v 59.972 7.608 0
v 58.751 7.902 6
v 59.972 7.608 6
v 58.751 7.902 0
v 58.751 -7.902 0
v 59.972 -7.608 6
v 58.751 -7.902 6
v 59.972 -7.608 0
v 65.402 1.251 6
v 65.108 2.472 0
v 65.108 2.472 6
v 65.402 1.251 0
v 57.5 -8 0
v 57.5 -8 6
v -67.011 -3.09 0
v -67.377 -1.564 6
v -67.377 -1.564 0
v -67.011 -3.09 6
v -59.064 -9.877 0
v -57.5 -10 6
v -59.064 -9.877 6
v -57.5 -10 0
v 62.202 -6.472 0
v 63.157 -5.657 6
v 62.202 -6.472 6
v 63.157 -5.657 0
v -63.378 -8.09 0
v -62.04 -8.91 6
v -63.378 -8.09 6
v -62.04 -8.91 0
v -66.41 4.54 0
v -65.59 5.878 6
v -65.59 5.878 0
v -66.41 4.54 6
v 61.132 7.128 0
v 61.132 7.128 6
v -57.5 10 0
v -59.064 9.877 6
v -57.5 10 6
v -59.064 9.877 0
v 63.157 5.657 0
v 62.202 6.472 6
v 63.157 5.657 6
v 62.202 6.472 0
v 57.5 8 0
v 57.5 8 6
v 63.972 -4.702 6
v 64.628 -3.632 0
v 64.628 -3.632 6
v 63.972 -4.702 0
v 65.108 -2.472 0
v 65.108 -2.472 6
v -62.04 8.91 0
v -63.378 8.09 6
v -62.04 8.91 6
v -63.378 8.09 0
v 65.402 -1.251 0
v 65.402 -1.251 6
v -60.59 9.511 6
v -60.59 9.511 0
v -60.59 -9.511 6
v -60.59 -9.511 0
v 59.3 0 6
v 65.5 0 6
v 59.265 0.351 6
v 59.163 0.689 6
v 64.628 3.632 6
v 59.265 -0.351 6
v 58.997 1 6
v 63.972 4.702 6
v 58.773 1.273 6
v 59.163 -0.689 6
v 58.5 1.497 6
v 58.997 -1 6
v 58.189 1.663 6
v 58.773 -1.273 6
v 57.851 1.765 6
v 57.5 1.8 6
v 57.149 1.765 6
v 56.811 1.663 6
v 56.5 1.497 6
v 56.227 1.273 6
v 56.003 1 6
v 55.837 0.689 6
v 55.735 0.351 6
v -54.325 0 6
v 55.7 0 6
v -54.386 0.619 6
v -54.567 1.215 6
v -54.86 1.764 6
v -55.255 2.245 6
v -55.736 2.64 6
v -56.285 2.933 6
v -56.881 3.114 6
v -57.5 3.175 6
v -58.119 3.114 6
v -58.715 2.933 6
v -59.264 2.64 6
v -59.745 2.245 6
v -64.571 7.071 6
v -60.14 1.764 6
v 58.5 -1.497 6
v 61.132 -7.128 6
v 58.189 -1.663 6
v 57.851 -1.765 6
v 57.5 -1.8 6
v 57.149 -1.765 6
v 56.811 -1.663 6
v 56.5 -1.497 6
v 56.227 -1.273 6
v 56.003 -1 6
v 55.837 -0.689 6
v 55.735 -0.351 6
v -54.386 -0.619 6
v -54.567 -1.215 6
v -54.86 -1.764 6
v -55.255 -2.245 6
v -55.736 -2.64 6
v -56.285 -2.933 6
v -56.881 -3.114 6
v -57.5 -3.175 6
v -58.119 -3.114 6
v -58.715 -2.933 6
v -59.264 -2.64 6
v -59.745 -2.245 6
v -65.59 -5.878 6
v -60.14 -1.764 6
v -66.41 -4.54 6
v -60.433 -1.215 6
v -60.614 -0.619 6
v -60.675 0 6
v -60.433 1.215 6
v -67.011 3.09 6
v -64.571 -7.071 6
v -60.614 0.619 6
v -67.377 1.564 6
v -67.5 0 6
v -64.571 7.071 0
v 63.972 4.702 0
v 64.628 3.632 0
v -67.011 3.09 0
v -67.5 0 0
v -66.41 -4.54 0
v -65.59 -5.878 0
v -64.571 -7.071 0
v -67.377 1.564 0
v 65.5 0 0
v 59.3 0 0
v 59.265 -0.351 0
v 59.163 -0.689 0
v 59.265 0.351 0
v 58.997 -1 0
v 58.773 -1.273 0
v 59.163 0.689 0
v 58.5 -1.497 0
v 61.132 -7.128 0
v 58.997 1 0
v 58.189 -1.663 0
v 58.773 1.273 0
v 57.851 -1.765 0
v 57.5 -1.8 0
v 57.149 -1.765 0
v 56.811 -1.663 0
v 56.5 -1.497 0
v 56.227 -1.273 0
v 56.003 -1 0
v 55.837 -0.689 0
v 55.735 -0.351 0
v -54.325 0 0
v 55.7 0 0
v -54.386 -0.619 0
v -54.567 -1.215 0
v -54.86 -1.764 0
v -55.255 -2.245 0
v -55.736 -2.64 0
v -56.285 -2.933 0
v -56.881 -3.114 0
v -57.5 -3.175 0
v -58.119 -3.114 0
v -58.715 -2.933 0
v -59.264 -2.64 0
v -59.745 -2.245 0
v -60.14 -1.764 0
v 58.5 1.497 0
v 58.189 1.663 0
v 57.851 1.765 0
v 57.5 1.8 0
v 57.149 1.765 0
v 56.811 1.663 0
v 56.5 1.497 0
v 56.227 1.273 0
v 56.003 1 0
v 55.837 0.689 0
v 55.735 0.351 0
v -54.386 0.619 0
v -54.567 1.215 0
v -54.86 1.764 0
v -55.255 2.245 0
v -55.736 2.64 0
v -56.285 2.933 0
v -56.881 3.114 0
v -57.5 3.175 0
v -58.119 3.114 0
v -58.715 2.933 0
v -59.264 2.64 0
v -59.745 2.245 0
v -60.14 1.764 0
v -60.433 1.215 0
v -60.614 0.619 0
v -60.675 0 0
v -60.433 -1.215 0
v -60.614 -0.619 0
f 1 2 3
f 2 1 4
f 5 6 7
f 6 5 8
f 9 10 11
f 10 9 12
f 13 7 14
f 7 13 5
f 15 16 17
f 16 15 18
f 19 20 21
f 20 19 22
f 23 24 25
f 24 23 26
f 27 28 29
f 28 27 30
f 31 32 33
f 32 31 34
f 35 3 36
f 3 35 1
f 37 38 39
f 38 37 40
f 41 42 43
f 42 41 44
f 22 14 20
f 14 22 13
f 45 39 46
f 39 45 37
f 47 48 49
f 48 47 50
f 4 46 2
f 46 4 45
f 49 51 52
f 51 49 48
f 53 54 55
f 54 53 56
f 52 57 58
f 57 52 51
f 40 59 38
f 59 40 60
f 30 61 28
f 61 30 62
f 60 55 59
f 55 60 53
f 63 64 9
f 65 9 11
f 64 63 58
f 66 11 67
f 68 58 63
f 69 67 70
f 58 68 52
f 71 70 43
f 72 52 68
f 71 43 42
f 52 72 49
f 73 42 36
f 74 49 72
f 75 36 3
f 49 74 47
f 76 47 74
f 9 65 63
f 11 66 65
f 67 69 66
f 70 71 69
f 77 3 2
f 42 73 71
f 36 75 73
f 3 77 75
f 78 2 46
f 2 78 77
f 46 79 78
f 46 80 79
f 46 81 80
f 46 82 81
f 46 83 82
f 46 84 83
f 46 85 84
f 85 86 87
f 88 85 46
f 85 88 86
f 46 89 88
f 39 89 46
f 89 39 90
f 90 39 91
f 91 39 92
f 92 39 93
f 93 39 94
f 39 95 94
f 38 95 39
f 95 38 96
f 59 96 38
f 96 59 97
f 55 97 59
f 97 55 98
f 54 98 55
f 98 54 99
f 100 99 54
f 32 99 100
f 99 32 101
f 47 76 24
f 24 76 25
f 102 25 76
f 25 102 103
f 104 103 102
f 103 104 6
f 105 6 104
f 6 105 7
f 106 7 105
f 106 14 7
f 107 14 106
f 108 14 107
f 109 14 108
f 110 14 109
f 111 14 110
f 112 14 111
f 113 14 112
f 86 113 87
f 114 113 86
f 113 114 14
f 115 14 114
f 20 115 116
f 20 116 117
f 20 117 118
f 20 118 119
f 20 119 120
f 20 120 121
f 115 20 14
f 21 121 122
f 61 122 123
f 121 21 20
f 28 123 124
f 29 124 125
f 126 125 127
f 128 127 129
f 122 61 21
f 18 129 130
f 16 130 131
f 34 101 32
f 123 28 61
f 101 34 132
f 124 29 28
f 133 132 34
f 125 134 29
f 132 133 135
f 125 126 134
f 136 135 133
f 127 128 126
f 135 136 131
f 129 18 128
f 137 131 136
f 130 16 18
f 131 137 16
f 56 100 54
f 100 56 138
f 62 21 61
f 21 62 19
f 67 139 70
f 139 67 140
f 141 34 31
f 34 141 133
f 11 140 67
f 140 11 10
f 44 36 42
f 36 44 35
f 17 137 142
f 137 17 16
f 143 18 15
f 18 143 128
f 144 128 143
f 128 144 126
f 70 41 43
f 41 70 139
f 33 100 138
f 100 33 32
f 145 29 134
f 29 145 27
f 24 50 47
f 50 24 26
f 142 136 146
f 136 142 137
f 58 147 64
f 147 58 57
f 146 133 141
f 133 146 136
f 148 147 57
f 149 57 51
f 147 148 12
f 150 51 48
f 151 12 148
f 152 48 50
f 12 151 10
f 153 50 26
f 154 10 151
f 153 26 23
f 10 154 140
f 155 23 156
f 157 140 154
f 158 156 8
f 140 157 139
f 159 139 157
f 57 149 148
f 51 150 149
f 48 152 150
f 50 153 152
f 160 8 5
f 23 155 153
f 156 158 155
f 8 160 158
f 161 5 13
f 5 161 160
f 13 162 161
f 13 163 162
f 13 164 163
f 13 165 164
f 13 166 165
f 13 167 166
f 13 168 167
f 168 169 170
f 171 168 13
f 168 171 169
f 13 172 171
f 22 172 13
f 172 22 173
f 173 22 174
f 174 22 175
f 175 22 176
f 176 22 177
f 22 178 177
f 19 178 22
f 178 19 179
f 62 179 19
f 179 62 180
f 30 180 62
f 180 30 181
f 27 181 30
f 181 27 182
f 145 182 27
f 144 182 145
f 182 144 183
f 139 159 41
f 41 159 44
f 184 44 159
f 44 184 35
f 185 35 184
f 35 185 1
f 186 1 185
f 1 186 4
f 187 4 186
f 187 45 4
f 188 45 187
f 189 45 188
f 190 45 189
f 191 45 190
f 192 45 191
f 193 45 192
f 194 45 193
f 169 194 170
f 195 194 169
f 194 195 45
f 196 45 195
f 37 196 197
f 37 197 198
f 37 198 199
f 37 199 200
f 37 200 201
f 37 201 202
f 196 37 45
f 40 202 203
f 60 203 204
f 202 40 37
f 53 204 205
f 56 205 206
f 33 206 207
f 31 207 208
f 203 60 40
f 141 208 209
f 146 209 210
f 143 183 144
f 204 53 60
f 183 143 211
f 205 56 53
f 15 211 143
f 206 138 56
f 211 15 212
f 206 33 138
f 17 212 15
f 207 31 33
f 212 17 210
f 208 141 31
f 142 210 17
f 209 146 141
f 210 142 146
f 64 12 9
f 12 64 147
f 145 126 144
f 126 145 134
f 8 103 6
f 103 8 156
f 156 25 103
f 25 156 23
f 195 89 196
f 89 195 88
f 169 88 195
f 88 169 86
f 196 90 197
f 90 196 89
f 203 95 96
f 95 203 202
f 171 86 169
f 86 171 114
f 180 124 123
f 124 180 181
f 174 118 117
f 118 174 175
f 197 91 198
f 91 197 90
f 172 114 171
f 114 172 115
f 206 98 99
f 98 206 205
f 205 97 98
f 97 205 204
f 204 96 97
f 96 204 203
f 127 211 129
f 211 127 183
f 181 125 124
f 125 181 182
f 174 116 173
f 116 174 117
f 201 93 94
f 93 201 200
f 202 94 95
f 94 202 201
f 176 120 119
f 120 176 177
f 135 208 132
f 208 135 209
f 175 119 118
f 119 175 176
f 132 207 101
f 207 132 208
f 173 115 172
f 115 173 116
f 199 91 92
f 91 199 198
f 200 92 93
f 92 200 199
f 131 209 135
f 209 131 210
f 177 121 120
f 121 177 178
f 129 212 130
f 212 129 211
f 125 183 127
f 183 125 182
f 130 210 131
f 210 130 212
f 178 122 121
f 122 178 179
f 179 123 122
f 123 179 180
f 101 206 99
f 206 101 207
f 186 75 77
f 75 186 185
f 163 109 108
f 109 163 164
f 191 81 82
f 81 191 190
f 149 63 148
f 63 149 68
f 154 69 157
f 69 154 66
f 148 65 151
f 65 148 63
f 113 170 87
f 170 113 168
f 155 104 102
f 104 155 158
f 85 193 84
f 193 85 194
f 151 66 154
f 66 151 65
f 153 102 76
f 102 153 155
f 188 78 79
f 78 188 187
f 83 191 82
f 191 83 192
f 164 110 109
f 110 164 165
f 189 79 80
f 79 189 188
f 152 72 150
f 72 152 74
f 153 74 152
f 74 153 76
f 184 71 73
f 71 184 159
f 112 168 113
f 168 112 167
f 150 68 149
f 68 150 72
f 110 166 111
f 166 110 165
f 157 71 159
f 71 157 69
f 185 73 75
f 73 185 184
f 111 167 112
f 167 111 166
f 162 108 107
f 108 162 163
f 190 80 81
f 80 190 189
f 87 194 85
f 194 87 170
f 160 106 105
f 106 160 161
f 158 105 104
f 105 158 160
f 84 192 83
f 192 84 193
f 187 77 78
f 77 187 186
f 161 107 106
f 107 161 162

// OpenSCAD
$fn = 32;

// ----------------------------------------------------------------------
// Lever: 115 mm between the bosses, 6 mm thick, smooth outline
// ----------------------------------------------------------------------

// --- parameters (mm) ---
lever_l = 115;            // distance between the boss centres
boss_a = 20;              // first boss diameter
boss_b = 16;              // second boss diameter
bore_a = 6.35;            // first bore
bore_b = 3.6;             // second bore
lever_t = 6;              // lever thickness

lever_profile = [[-67.5, 0], [-67.377, -1.564], [-67.011, -3.09], [-66.41, -4.54], [-65.59, -5.878], [-64.571, -7.071], [-63.378, -8.09], [-62.04, -8.91], [-60.59, -9.511], [-59.064, -9.877], [-57.5, -10], [57.5, -8], [58.751, -7.902], [59.972, -7.608], [61.132, -7.128], [62.202, -6.472], [63.157, -5.657], [63.972, -4.702], [64.628, -3.632], [65.108, -2.472], [65.402, -1.251], [65.5, 0], [65.402, 1.251], [65.108, 2.472], [64.628, 3.632], [63.972, 4.702], [63.157, 5.657], [62.202, 6.472], [61.132, 7.128], [59.972, 7.608], [58.751, 7.902], [57.5, 8], [-57.5, 10], [-59.064, 9.877], [-60.59, 9.511], [-62.04, 8.91], [-63.378, 8.09], [-64.571, 7.071], [-65.59, 5.878], [-66.41, 4.54], [-67.011, 3.09], [-67.377, 1.564]];

difference() {
  linear_extrude(height = lever_t) polygon(lever_profile);
  translate([-57.5, 0, -2.5]) cylinder(h = lever_t + 5, d = bore_a);
  translate([57.5, 0, -2.5]) cylinder(h = lever_t + 5, d = bore_b);
}
